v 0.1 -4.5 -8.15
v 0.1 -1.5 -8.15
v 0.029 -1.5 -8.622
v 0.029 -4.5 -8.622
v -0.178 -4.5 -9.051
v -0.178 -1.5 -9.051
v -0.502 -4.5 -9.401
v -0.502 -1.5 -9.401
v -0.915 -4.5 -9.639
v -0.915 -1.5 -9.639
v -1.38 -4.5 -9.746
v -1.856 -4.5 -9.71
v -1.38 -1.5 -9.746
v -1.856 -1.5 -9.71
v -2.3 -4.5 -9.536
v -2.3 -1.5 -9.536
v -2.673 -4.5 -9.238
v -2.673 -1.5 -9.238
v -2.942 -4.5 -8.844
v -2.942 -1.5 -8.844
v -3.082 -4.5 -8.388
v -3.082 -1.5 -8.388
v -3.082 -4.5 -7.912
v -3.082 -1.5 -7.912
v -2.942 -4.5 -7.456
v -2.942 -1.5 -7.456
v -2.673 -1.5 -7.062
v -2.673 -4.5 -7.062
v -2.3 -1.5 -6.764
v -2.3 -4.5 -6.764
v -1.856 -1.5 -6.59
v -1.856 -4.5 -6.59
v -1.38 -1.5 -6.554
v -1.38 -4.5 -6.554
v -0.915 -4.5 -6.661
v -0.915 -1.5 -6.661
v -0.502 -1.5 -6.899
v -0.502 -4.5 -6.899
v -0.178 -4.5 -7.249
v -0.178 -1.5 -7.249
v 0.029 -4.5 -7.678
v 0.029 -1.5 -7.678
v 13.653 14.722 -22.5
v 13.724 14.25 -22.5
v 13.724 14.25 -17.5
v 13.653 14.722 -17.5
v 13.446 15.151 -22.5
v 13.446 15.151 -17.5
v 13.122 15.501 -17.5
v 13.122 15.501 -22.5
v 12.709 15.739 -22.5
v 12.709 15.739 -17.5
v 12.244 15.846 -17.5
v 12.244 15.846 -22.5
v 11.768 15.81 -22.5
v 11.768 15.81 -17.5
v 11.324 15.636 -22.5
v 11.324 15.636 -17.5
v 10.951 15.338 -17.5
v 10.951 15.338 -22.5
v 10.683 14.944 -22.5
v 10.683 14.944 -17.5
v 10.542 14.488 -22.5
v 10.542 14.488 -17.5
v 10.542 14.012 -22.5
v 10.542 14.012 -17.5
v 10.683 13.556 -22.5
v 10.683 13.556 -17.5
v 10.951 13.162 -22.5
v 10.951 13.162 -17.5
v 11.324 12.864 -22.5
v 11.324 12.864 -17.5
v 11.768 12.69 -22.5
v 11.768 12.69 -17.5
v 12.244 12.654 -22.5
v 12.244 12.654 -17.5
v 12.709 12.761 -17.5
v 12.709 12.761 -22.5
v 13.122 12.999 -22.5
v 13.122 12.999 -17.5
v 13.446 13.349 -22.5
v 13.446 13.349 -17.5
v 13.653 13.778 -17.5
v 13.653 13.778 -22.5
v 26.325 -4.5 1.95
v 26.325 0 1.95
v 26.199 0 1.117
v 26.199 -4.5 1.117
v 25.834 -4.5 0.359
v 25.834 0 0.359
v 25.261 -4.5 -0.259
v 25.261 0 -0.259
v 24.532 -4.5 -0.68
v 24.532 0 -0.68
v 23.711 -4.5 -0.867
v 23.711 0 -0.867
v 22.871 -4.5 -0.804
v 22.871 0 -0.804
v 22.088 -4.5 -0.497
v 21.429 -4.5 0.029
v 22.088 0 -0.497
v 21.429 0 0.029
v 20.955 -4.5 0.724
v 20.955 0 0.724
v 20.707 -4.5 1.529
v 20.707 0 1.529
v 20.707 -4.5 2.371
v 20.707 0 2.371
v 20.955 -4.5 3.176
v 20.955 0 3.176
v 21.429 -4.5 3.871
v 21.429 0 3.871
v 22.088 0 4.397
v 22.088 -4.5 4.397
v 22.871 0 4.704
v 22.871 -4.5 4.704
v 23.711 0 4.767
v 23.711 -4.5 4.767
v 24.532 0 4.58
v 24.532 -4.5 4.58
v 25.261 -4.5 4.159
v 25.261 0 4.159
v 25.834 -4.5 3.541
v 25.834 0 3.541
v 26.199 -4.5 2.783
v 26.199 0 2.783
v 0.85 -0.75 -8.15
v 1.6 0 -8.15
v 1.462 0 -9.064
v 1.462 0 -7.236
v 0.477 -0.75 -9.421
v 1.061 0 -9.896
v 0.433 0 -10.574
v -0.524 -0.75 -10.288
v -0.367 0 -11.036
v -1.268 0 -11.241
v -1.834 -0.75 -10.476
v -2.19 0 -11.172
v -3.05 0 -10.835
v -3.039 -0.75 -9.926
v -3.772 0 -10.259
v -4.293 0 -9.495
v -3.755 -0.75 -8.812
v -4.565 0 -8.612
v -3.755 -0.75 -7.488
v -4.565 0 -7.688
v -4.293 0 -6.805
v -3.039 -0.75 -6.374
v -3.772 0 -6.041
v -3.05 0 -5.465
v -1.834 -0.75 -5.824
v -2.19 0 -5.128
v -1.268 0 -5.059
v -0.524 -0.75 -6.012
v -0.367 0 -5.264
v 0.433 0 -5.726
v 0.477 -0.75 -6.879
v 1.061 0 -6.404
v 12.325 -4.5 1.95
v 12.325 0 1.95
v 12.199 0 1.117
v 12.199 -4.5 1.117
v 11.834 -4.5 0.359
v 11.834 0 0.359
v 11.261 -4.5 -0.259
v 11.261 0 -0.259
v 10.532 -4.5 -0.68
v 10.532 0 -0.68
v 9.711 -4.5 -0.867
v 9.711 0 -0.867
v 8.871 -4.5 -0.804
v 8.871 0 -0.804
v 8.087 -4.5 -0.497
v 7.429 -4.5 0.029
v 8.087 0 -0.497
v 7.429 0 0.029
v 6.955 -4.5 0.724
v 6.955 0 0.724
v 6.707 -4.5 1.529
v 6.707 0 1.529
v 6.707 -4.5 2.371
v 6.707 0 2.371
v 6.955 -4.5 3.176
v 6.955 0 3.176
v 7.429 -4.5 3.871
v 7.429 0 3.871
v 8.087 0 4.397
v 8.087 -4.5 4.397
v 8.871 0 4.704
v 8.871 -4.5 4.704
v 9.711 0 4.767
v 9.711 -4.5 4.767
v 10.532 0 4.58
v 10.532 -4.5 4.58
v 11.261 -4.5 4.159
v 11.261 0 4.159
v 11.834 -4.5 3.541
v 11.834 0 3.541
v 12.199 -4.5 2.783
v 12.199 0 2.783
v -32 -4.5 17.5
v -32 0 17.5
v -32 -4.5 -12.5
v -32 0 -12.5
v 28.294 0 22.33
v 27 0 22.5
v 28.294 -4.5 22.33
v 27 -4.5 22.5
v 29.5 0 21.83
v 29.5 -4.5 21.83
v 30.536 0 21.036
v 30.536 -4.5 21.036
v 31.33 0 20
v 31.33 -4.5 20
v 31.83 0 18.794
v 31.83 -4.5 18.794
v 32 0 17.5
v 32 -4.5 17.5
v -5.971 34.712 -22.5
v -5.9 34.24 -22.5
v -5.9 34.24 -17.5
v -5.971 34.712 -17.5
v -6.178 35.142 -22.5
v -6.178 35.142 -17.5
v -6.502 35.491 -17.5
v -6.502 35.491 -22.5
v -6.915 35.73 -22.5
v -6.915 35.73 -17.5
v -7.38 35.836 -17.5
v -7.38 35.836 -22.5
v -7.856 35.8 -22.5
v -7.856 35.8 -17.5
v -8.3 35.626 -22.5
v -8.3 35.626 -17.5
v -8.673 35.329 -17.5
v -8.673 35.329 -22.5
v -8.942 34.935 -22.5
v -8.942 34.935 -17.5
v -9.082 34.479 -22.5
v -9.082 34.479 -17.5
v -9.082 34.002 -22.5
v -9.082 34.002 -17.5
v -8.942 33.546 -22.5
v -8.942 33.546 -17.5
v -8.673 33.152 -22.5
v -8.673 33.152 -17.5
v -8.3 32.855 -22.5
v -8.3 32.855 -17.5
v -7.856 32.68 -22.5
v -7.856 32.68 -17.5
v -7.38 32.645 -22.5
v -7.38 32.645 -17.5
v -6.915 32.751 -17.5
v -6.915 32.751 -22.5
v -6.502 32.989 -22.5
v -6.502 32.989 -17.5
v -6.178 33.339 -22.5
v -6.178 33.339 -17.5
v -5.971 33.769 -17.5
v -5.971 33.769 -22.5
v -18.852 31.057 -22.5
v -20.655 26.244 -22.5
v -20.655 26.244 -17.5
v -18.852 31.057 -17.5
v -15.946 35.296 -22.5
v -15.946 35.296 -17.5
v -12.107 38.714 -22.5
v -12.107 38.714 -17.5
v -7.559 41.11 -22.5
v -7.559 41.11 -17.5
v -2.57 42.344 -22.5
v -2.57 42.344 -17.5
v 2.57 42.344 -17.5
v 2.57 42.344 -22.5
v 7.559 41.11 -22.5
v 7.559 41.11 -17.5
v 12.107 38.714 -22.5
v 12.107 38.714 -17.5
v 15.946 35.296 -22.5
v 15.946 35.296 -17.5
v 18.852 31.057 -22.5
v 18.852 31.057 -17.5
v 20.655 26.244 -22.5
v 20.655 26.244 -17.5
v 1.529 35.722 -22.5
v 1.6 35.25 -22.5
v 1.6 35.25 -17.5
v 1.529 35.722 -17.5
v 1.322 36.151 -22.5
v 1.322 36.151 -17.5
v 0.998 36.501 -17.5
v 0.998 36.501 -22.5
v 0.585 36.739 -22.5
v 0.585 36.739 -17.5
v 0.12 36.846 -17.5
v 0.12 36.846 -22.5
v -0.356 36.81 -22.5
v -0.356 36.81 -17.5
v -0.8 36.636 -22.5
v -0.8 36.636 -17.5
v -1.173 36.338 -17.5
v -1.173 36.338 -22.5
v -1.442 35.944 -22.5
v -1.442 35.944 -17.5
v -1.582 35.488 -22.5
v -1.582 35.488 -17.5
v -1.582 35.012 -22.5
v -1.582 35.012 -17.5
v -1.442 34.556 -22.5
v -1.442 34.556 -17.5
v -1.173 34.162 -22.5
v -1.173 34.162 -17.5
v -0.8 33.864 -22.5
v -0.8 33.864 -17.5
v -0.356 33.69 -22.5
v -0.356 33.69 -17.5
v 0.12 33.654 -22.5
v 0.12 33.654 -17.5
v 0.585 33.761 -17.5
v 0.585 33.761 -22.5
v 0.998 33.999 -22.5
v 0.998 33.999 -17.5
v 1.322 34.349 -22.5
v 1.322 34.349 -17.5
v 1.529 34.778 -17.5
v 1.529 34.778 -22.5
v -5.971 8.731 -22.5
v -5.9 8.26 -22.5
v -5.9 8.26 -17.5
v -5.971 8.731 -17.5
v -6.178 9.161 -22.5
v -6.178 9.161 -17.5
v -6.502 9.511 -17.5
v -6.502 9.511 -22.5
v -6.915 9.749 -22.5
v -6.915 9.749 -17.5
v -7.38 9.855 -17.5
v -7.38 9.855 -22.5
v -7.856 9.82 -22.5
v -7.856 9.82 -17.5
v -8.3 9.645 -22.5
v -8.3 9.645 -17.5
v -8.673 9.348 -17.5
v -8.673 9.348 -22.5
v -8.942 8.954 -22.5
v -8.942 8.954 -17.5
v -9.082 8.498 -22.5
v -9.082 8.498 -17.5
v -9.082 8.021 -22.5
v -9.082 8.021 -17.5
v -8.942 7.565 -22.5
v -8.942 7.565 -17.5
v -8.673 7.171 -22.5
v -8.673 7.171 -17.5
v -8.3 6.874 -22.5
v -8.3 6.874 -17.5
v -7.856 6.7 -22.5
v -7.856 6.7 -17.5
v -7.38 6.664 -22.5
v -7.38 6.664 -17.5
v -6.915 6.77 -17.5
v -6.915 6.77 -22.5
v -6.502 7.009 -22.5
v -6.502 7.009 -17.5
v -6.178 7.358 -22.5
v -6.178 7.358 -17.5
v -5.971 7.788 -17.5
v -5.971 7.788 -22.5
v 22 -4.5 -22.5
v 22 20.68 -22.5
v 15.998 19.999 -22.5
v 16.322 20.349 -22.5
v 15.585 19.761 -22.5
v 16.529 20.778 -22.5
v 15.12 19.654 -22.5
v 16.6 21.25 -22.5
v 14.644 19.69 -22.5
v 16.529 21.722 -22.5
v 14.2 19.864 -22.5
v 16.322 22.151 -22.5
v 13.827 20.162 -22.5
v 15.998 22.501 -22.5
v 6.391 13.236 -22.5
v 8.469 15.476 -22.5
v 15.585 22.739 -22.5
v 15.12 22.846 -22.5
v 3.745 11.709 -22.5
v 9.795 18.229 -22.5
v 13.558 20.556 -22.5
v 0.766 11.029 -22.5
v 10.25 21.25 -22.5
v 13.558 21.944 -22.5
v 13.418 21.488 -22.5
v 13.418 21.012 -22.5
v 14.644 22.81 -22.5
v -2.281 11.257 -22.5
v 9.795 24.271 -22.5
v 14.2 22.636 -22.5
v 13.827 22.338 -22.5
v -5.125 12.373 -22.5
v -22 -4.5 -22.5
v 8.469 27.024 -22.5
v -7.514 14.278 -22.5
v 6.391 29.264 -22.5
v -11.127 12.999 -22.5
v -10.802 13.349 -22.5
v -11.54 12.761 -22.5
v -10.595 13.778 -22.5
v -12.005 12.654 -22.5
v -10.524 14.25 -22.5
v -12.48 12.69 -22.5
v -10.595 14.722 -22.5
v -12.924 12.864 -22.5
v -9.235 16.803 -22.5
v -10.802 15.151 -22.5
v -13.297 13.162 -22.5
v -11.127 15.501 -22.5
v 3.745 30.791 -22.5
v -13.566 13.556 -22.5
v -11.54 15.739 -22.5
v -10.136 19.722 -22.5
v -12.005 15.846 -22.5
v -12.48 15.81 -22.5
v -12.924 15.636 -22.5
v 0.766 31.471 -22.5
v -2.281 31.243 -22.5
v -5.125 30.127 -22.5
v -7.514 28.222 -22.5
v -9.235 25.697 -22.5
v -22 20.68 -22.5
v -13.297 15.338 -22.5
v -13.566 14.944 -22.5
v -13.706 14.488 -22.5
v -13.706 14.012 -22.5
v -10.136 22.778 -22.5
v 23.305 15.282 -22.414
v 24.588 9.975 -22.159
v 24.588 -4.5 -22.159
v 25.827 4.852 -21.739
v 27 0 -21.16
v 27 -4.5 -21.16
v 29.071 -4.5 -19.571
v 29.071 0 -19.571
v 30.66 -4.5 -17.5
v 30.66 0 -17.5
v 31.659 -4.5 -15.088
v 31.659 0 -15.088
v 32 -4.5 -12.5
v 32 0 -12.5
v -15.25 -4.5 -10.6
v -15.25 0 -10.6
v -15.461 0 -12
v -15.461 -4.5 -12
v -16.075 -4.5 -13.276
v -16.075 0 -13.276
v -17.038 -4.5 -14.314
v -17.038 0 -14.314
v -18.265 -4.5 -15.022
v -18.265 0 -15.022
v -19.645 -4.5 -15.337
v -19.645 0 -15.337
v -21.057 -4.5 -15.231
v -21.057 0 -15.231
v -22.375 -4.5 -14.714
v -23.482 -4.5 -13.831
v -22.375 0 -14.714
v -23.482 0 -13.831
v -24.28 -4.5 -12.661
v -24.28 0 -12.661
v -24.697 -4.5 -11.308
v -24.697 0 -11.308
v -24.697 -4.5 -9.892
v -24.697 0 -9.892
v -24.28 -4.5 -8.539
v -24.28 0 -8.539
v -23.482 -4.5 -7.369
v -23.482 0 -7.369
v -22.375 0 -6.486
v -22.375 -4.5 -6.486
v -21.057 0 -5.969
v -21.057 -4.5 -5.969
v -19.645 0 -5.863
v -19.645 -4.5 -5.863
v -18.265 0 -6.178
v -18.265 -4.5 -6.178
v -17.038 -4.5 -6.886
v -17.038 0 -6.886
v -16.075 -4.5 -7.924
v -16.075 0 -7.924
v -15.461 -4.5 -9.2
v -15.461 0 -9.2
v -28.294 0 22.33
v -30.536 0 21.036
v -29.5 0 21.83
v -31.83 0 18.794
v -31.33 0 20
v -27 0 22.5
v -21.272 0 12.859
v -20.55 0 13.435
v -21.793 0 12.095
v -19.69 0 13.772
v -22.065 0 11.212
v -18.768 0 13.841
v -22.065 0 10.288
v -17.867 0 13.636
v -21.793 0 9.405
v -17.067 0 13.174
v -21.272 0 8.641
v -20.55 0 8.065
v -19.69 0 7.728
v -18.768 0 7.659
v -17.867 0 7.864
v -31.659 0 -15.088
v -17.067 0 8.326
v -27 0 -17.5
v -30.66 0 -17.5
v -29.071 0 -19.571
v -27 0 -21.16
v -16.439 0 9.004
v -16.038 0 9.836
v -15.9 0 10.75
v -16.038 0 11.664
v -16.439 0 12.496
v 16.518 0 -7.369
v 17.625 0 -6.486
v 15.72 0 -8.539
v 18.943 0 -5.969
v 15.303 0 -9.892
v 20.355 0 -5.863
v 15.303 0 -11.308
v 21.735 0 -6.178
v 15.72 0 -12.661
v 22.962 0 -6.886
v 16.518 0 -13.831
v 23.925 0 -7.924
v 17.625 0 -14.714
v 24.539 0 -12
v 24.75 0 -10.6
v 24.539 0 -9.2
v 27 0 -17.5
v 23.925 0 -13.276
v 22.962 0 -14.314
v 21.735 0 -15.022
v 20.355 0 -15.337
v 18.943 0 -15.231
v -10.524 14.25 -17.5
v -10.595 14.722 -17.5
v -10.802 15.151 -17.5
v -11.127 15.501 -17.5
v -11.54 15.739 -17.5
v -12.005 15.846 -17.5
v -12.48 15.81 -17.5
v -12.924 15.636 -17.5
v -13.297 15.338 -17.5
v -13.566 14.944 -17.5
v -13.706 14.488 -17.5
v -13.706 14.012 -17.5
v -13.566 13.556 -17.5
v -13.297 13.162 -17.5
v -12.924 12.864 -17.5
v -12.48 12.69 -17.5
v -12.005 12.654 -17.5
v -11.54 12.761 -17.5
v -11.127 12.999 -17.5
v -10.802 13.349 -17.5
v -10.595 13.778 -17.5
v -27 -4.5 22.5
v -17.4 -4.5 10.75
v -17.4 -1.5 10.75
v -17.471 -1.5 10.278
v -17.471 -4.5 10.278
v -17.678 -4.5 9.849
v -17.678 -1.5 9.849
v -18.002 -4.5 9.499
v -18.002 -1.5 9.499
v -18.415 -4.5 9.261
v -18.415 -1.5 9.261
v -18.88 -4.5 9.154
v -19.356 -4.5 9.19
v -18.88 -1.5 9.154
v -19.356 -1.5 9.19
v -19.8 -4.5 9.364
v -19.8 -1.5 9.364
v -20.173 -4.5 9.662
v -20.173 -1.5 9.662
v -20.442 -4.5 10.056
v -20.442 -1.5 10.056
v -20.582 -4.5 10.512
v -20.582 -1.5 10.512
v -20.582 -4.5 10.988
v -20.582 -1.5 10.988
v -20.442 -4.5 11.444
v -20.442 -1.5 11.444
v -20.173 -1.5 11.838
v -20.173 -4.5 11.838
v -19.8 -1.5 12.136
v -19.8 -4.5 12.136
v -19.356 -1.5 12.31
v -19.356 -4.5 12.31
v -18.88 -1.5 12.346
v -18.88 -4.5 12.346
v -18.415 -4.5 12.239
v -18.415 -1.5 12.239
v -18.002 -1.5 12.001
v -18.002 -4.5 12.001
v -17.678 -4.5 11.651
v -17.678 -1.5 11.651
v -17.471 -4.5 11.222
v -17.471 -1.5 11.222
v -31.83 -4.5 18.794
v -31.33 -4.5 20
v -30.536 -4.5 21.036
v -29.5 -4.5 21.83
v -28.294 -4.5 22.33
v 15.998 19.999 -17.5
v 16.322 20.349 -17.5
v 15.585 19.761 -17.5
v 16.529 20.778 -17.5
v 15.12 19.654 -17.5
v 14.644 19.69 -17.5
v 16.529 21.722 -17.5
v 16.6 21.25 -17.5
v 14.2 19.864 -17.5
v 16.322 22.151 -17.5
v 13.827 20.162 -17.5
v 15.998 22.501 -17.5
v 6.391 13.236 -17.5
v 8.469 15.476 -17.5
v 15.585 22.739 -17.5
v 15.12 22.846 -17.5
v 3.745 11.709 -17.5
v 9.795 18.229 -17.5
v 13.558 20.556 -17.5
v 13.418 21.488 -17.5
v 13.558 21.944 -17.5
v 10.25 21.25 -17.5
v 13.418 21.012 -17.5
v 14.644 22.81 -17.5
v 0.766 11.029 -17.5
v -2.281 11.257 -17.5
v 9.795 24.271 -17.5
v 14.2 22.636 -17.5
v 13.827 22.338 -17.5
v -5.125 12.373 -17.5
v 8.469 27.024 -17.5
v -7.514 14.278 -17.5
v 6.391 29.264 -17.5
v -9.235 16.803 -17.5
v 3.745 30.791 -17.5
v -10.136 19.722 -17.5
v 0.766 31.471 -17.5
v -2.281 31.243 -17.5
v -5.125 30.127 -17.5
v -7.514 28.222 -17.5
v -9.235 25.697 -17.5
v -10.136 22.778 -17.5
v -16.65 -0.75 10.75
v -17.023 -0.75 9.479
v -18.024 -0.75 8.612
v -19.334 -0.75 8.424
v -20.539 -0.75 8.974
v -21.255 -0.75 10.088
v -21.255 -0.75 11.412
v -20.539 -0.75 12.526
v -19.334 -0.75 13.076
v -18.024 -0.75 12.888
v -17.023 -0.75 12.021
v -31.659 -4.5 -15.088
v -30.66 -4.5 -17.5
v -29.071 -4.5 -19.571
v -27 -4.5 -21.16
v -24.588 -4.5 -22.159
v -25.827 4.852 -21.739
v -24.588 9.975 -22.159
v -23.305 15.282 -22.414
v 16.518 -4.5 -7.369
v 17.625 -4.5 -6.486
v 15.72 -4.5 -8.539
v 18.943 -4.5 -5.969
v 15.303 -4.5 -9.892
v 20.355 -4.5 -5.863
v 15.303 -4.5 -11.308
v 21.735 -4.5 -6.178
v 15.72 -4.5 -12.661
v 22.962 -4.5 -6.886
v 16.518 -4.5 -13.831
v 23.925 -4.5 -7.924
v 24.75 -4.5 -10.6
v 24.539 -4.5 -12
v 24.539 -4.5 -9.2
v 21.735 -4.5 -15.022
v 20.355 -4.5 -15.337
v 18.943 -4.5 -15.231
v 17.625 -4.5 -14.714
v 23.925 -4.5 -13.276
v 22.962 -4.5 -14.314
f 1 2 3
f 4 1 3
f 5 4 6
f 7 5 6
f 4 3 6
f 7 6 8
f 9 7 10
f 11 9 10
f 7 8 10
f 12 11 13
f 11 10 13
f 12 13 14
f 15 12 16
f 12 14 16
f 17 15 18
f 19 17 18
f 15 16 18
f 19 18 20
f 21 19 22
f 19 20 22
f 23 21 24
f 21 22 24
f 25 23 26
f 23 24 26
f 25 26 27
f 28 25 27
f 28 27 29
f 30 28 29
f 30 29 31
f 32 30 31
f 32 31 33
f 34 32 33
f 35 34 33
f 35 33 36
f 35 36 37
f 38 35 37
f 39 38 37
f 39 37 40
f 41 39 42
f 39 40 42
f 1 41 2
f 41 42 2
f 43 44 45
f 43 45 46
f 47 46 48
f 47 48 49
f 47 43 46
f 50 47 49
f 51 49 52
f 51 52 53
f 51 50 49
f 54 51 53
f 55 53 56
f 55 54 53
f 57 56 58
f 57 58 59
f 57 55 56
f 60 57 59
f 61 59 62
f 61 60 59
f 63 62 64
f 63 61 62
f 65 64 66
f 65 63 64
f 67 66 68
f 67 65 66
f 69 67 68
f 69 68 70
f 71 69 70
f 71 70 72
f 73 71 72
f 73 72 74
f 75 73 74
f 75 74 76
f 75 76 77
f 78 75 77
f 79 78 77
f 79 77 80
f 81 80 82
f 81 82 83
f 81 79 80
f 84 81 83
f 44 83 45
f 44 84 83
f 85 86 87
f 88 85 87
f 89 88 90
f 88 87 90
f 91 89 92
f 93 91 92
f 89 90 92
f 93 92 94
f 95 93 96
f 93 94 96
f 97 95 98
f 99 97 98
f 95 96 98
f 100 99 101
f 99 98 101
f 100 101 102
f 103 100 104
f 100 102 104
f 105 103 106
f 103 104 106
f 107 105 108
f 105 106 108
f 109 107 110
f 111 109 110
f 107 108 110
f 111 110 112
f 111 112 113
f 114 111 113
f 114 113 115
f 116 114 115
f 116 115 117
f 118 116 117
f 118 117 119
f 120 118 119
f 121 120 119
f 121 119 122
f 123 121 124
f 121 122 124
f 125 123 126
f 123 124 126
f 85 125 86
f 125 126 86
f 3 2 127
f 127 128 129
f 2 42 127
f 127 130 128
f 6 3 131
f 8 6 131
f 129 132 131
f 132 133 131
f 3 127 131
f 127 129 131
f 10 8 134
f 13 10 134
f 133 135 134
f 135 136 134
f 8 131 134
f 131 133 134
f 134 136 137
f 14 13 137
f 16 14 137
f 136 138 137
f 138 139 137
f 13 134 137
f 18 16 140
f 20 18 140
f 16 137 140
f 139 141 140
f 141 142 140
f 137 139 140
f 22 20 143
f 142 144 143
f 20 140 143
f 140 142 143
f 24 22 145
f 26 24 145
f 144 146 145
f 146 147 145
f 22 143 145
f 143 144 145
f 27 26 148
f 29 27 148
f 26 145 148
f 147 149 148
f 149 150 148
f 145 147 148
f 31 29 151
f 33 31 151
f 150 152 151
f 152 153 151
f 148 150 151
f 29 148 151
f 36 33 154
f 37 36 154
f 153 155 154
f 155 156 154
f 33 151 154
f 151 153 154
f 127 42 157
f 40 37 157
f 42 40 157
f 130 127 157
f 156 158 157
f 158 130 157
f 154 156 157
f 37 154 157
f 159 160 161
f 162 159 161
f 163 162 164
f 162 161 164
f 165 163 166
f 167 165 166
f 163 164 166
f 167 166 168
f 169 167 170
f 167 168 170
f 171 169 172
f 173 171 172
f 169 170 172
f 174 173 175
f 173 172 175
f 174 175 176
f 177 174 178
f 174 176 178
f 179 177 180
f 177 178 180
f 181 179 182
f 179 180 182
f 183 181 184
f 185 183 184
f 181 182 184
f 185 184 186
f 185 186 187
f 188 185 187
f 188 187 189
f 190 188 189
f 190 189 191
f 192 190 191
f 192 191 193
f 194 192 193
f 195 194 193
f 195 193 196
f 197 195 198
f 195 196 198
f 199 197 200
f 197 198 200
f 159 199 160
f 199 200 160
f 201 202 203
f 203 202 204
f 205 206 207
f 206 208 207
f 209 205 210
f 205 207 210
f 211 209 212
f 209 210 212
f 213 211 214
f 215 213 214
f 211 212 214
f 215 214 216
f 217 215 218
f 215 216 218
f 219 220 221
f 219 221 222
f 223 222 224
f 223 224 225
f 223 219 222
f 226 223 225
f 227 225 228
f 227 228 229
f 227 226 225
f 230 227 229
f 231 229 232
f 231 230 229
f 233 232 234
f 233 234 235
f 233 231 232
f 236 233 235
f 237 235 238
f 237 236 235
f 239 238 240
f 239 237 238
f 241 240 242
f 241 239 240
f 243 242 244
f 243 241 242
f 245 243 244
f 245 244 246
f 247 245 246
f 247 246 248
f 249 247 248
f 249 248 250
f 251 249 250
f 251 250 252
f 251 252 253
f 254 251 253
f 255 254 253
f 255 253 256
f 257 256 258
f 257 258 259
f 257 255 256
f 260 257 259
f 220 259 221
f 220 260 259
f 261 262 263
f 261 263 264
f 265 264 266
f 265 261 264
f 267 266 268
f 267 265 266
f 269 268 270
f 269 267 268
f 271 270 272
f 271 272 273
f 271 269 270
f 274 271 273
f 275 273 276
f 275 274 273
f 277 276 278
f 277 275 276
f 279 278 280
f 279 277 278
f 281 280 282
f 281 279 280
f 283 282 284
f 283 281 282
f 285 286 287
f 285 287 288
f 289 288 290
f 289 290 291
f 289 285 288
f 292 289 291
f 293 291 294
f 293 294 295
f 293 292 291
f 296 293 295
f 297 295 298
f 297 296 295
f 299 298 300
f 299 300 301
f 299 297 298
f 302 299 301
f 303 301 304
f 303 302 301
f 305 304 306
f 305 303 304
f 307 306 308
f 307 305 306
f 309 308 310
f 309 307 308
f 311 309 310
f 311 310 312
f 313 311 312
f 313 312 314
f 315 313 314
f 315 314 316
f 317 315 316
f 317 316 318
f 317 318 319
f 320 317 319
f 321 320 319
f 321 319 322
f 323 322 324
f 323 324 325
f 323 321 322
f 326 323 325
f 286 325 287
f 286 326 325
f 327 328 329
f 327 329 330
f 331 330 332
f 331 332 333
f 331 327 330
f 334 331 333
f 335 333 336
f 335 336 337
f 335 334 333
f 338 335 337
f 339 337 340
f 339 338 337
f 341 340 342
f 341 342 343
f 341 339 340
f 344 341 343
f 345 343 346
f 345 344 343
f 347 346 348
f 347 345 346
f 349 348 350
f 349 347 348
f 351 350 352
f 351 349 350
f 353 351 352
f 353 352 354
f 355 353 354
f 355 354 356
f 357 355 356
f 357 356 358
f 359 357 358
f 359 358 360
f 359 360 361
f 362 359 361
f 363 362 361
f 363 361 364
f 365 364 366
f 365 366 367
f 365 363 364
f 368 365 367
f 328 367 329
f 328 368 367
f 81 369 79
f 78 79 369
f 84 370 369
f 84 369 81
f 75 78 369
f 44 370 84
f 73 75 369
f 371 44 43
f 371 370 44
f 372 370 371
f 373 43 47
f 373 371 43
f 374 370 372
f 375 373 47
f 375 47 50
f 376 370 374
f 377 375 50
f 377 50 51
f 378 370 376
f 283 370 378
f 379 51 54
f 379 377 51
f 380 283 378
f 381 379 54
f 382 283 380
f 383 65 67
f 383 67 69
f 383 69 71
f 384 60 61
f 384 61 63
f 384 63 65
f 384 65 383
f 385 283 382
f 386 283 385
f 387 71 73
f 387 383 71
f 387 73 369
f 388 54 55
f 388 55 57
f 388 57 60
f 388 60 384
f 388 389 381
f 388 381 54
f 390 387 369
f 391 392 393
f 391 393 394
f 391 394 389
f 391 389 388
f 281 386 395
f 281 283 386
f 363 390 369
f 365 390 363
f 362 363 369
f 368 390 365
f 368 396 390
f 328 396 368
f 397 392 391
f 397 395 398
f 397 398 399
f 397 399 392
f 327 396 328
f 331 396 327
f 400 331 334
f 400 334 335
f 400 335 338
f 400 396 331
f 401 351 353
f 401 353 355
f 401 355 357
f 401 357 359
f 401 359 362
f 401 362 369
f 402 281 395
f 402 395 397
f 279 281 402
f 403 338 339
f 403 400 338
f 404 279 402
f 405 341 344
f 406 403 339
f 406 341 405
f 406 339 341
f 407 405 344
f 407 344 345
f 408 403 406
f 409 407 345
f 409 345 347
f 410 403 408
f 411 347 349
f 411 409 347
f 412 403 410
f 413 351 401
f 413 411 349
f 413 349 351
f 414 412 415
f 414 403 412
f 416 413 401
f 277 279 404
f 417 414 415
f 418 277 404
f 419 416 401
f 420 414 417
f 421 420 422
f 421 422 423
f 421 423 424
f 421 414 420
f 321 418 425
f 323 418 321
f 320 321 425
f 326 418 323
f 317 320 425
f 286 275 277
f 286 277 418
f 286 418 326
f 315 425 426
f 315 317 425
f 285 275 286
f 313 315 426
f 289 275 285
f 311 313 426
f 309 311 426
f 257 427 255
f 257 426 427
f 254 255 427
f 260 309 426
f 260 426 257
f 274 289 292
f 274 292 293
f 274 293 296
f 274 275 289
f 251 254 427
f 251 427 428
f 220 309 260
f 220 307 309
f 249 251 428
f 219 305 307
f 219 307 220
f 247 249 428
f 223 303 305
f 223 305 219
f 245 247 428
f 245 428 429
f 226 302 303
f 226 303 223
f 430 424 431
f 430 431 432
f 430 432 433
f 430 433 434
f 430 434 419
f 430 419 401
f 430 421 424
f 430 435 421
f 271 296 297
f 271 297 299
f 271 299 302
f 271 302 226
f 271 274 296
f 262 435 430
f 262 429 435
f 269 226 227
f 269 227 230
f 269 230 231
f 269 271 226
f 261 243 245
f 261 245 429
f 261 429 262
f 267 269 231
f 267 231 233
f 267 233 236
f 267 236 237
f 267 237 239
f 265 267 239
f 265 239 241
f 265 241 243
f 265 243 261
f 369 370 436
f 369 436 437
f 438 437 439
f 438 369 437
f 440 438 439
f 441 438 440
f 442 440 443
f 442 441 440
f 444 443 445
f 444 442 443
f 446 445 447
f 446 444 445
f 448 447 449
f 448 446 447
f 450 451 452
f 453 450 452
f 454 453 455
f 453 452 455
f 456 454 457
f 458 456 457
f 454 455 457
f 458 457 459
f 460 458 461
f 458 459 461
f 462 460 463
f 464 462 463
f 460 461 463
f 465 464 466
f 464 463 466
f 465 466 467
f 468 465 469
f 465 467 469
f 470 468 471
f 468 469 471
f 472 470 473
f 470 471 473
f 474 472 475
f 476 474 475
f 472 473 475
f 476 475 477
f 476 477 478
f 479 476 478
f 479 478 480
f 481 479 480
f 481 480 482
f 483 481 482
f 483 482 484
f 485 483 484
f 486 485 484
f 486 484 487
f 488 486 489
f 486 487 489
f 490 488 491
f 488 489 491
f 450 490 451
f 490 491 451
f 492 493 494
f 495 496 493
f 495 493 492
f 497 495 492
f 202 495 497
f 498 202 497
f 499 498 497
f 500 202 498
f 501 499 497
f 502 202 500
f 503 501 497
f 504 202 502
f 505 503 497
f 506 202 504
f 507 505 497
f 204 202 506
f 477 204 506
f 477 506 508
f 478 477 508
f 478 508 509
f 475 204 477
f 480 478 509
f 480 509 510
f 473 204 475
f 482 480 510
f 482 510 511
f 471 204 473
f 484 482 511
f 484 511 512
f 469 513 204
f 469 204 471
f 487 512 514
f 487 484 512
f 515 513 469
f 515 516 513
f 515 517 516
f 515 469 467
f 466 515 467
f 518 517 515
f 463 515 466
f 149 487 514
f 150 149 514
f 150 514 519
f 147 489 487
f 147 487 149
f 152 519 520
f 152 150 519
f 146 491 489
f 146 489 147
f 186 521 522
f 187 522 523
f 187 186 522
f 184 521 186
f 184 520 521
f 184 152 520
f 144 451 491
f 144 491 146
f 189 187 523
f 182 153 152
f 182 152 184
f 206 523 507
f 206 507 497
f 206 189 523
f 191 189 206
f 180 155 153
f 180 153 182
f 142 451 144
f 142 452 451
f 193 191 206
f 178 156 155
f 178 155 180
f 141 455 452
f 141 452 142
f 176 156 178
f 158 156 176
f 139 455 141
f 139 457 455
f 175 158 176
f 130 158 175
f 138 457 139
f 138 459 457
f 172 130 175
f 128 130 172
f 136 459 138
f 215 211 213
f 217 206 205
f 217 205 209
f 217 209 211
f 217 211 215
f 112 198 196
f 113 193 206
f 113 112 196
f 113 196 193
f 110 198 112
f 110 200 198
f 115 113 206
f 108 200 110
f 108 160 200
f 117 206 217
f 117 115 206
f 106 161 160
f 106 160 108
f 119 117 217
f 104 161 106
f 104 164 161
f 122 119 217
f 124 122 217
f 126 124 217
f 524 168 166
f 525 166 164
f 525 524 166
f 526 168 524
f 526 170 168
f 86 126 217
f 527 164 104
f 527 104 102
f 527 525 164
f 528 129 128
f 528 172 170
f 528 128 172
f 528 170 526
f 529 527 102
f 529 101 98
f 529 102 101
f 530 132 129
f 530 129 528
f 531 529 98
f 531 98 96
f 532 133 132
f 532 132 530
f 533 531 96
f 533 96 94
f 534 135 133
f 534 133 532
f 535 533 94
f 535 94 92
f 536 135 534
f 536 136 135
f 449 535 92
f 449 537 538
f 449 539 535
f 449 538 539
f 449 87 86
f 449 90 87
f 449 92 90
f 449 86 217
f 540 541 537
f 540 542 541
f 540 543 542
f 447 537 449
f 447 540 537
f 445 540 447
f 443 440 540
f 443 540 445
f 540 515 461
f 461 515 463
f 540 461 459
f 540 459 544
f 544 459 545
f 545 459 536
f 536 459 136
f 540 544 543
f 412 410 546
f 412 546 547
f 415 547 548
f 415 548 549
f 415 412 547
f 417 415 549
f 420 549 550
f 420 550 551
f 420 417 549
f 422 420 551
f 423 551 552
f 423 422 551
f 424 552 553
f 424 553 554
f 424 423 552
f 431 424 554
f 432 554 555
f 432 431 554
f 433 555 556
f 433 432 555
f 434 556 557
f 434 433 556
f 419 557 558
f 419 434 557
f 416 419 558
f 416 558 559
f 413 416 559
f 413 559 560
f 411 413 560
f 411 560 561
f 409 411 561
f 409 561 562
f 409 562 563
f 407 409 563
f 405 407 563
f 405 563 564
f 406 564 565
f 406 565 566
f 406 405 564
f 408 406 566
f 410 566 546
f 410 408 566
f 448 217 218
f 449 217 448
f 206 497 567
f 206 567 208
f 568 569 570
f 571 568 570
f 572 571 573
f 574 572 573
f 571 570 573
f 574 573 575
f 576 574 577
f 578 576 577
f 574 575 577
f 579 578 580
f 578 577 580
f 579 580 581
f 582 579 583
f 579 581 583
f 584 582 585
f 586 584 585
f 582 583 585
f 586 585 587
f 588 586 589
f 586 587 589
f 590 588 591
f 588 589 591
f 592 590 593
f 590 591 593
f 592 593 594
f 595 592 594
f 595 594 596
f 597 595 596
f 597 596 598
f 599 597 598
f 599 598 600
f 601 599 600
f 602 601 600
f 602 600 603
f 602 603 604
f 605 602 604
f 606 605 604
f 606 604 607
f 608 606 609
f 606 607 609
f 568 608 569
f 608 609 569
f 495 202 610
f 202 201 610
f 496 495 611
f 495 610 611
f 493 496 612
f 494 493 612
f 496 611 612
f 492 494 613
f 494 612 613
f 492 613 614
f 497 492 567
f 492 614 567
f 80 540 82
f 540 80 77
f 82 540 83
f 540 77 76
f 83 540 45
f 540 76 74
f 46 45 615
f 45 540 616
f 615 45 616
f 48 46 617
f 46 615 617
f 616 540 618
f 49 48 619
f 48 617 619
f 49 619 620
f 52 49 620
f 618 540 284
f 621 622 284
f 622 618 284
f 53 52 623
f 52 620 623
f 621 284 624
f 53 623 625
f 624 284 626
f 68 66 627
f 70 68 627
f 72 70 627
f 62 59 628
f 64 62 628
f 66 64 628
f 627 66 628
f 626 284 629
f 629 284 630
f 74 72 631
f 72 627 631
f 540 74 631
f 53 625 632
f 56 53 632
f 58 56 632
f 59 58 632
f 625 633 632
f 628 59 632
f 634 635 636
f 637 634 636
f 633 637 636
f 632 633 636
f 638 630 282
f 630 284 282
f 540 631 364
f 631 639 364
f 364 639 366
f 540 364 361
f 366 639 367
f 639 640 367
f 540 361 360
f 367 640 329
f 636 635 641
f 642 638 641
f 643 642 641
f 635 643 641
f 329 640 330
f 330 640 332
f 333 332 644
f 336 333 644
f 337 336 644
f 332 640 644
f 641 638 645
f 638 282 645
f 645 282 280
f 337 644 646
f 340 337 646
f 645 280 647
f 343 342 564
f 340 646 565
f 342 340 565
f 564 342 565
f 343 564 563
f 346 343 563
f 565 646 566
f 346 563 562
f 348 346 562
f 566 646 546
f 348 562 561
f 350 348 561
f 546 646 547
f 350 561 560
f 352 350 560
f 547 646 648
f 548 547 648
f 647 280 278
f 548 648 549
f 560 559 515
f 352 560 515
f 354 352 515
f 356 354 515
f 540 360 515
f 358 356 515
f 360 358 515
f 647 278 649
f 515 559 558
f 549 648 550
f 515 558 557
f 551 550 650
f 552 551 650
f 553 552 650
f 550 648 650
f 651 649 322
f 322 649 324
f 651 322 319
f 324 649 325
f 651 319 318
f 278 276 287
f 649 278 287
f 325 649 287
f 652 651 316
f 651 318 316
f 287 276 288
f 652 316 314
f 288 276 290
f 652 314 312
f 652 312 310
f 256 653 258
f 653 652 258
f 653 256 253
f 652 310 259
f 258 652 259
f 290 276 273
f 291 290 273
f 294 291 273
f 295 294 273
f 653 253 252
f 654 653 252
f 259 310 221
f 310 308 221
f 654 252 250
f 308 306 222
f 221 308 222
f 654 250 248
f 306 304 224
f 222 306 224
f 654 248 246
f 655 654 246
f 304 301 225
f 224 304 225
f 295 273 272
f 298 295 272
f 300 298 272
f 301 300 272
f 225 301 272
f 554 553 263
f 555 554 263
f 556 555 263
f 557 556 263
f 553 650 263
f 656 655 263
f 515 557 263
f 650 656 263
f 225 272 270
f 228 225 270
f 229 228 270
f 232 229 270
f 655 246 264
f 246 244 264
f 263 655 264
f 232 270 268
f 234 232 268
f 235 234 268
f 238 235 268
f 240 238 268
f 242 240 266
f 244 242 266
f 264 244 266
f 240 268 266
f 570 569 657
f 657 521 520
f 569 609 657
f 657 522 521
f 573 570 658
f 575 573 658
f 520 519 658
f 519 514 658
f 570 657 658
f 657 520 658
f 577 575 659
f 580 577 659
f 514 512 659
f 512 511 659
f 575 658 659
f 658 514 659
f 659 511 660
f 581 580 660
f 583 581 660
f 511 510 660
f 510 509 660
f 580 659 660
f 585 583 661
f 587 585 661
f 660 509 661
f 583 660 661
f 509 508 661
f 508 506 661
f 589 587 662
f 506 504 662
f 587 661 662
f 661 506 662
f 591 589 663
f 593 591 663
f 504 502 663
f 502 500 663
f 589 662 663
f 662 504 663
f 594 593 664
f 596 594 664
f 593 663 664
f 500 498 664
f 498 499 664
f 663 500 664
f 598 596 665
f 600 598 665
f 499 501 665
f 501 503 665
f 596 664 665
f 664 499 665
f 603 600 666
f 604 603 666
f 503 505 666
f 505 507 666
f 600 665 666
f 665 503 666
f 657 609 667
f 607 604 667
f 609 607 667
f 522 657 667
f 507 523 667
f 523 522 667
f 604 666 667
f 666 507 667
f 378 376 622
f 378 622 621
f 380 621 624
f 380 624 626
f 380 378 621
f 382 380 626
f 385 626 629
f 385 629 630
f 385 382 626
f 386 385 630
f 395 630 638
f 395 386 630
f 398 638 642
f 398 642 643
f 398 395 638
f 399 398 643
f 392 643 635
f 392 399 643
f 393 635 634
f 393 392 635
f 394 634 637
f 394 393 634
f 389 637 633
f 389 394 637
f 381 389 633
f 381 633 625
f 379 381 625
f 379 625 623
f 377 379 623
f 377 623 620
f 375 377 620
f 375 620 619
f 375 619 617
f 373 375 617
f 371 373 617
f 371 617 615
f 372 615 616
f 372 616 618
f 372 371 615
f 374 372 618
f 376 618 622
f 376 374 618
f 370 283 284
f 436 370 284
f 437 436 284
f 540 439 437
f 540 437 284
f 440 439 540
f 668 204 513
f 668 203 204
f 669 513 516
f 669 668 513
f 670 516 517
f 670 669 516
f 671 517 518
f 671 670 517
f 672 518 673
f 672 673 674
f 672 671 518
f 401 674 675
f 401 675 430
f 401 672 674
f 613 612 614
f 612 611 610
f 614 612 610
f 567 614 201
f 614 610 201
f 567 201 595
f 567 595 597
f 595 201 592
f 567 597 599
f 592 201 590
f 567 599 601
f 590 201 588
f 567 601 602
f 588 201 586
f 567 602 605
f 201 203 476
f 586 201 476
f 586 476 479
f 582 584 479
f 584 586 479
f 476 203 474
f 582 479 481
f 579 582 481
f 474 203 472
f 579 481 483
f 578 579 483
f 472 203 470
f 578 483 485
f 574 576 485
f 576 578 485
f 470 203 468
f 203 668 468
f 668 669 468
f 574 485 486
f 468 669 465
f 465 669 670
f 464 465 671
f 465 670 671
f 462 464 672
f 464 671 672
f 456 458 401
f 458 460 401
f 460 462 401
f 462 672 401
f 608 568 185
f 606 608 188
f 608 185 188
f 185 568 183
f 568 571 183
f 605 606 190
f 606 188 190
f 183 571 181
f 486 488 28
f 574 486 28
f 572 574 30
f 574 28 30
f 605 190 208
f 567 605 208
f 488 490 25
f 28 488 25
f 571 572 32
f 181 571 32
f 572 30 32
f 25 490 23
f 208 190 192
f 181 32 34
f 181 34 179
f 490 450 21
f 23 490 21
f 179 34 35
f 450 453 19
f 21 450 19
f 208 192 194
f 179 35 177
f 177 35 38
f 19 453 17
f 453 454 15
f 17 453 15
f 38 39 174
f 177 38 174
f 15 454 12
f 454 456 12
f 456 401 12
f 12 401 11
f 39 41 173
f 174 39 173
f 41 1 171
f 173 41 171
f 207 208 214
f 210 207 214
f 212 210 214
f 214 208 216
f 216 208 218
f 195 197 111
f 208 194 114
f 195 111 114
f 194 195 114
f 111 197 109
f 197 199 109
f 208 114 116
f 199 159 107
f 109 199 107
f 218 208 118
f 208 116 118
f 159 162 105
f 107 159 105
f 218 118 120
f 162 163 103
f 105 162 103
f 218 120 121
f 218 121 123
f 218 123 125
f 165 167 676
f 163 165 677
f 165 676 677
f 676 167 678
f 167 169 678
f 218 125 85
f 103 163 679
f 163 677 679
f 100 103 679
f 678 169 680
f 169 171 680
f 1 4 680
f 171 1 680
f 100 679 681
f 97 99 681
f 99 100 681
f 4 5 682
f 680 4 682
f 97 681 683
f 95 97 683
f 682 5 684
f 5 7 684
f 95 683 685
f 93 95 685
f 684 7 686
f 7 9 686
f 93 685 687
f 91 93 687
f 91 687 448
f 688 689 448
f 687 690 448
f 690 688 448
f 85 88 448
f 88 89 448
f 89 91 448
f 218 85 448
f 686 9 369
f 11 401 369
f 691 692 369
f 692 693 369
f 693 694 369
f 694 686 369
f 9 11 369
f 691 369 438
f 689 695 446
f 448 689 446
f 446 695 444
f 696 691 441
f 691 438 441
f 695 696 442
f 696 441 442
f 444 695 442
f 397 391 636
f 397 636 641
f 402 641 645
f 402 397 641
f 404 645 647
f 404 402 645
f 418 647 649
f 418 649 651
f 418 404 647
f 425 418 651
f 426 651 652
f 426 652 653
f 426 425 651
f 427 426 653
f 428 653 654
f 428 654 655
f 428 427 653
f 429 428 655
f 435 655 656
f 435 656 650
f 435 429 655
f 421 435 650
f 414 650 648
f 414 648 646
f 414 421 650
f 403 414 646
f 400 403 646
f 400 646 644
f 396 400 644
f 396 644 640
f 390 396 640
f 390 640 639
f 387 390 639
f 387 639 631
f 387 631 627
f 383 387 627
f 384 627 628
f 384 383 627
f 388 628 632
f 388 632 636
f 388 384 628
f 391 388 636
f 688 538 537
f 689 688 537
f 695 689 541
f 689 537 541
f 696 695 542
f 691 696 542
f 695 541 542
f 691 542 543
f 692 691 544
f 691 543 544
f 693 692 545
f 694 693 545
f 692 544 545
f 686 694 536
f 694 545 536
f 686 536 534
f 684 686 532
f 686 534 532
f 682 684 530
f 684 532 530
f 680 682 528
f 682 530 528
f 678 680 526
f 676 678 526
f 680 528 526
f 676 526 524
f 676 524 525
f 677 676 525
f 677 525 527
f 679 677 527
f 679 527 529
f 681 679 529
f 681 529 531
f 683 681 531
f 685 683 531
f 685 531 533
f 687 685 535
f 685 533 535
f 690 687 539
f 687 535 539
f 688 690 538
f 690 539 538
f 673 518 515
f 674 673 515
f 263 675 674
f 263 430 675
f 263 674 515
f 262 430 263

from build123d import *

# Parameters (mm, degrees)
SKETCH1_W           = 64
SKETCH1_H           = 45
SKETCH1_R           = 1.6
SKETCH1_R_2         = 2.825
SKETCH1_R_3         = 4.75
BOSS_EXTRUDE1_DEPTH = 4.5
CHAMFER1_SIZE       = 1.5
BOSS_EXTRUDE2_START = -22.5
SKETCH2_R           = 10.25
SKETCH2_R_2         = 1.6
BOSS_EXTRUDE2_DEPTH = 5
FILLET1_R           = 5
FILLET2_R           = 10


with BuildPart() as part:
    # Sketch1 → Boss-Extrude1 (new body)
    with BuildSketch(Plane(origin=(0, 0, 0), x_dir=(1, 0, 0), z_dir=(0, 1, 0))):
        Rectangle(SKETCH1_W, SKETCH1_H)
        with Locations((-1.5, 8.15)):
            Circle(SKETCH1_R, mode=Mode.SUBTRACT)
        with Locations((-19, -10.75)):
            Circle(SKETCH1_R, mode=Mode.SUBTRACT)
        with Locations((9.5, -1.95)):
            Circle(SKETCH1_R_2, mode=Mode.SUBTRACT)
        with Locations((23.5, -1.95)):
            Circle(SKETCH1_R_2, mode=Mode.SUBTRACT)
        with Locations((-20, 10.6)):
            Circle(SKETCH1_R_3, mode=Mode.SUBTRACT)
        with Locations((20, 10.6)):
            Circle(SKETCH1_R_3, mode=Mode.SUBTRACT)
    extrude(amount=-BOSS_EXTRUDE1_DEPTH)

    # Chamfer1
    chamfer1_edges = [part.edges().sort_by_distance(p)[0] for p in [
        (-3.1, 0, -8.15),
        (-20.6, 0, 10.75),
    ]]
    chamfer(chamfer1_edges, length=CHAMFER1_SIZE)

    # Sketch2 → Boss-Extrude2 (add)
    with BuildSketch(Plane.XY.offset(BOSS_EXTRUDE2_START)):
        with BuildLine():
            Line((-27, 0), (-20.654878501, 26.243845624))
            ThreePointArc((-20.654878501, 26.243845624), (0, 42.5), (20.654878501, 26.243845624))
            Line((20.654878501, 26.243845624), (27, 0))
            Line((27, 0), (27, -4.5))
            Line((27, -4.5), (-27, -4.5))
            Line((-27, -4.5), (-27, 0))
        make_face()
        with Locations((0, 21.25)):
            Circle(SKETCH2_R, mode=Mode.SUBTRACT)
        with Locations((0, 35.25)):
            Circle(SKETCH2_R_2, mode=Mode.SUBTRACT)
        with Locations((-7.5, 34.240381057)):
            Circle(SKETCH2_R_2, mode=Mode.SUBTRACT)
        with Locations((12.124355653, 14.25)):
            Circle(SKETCH2_R_2, mode=Mode.SUBTRACT)
        with Locations((15, 21.25)):
            Circle(SKETCH2_R_2, mode=Mode.SUBTRACT)
        with Locations((-12.124355653, 14.25)):
            Circle(SKETCH2_R_2, mode=Mode.SUBTRACT)
        with Locations((-7.5, 8.259618943)):
            Circle(SKETCH2_R_2, mode=Mode.SUBTRACT)
    extrude(amount=BOSS_EXTRUDE2_DEPTH)

    # Fillet1
    fillet1_edges = [part.edges().sort_by_distance(p)[0] for p in [
        (32, -2.25, 22.5),
        (-32, -2.25, 22.5),
    ]]
    fillet(fillet1_edges, radius=FILLET1_R)

    # Fillet2
    fillet2_edges = [part.edges().sort_by_distance(p)[0] for p in [
        (32, -2.25, -22.5),
        (-32, -2.25, -22.5),
    ]]
    fillet(fillet2_edges, radius=FILLET2_R)


solid = part.part
